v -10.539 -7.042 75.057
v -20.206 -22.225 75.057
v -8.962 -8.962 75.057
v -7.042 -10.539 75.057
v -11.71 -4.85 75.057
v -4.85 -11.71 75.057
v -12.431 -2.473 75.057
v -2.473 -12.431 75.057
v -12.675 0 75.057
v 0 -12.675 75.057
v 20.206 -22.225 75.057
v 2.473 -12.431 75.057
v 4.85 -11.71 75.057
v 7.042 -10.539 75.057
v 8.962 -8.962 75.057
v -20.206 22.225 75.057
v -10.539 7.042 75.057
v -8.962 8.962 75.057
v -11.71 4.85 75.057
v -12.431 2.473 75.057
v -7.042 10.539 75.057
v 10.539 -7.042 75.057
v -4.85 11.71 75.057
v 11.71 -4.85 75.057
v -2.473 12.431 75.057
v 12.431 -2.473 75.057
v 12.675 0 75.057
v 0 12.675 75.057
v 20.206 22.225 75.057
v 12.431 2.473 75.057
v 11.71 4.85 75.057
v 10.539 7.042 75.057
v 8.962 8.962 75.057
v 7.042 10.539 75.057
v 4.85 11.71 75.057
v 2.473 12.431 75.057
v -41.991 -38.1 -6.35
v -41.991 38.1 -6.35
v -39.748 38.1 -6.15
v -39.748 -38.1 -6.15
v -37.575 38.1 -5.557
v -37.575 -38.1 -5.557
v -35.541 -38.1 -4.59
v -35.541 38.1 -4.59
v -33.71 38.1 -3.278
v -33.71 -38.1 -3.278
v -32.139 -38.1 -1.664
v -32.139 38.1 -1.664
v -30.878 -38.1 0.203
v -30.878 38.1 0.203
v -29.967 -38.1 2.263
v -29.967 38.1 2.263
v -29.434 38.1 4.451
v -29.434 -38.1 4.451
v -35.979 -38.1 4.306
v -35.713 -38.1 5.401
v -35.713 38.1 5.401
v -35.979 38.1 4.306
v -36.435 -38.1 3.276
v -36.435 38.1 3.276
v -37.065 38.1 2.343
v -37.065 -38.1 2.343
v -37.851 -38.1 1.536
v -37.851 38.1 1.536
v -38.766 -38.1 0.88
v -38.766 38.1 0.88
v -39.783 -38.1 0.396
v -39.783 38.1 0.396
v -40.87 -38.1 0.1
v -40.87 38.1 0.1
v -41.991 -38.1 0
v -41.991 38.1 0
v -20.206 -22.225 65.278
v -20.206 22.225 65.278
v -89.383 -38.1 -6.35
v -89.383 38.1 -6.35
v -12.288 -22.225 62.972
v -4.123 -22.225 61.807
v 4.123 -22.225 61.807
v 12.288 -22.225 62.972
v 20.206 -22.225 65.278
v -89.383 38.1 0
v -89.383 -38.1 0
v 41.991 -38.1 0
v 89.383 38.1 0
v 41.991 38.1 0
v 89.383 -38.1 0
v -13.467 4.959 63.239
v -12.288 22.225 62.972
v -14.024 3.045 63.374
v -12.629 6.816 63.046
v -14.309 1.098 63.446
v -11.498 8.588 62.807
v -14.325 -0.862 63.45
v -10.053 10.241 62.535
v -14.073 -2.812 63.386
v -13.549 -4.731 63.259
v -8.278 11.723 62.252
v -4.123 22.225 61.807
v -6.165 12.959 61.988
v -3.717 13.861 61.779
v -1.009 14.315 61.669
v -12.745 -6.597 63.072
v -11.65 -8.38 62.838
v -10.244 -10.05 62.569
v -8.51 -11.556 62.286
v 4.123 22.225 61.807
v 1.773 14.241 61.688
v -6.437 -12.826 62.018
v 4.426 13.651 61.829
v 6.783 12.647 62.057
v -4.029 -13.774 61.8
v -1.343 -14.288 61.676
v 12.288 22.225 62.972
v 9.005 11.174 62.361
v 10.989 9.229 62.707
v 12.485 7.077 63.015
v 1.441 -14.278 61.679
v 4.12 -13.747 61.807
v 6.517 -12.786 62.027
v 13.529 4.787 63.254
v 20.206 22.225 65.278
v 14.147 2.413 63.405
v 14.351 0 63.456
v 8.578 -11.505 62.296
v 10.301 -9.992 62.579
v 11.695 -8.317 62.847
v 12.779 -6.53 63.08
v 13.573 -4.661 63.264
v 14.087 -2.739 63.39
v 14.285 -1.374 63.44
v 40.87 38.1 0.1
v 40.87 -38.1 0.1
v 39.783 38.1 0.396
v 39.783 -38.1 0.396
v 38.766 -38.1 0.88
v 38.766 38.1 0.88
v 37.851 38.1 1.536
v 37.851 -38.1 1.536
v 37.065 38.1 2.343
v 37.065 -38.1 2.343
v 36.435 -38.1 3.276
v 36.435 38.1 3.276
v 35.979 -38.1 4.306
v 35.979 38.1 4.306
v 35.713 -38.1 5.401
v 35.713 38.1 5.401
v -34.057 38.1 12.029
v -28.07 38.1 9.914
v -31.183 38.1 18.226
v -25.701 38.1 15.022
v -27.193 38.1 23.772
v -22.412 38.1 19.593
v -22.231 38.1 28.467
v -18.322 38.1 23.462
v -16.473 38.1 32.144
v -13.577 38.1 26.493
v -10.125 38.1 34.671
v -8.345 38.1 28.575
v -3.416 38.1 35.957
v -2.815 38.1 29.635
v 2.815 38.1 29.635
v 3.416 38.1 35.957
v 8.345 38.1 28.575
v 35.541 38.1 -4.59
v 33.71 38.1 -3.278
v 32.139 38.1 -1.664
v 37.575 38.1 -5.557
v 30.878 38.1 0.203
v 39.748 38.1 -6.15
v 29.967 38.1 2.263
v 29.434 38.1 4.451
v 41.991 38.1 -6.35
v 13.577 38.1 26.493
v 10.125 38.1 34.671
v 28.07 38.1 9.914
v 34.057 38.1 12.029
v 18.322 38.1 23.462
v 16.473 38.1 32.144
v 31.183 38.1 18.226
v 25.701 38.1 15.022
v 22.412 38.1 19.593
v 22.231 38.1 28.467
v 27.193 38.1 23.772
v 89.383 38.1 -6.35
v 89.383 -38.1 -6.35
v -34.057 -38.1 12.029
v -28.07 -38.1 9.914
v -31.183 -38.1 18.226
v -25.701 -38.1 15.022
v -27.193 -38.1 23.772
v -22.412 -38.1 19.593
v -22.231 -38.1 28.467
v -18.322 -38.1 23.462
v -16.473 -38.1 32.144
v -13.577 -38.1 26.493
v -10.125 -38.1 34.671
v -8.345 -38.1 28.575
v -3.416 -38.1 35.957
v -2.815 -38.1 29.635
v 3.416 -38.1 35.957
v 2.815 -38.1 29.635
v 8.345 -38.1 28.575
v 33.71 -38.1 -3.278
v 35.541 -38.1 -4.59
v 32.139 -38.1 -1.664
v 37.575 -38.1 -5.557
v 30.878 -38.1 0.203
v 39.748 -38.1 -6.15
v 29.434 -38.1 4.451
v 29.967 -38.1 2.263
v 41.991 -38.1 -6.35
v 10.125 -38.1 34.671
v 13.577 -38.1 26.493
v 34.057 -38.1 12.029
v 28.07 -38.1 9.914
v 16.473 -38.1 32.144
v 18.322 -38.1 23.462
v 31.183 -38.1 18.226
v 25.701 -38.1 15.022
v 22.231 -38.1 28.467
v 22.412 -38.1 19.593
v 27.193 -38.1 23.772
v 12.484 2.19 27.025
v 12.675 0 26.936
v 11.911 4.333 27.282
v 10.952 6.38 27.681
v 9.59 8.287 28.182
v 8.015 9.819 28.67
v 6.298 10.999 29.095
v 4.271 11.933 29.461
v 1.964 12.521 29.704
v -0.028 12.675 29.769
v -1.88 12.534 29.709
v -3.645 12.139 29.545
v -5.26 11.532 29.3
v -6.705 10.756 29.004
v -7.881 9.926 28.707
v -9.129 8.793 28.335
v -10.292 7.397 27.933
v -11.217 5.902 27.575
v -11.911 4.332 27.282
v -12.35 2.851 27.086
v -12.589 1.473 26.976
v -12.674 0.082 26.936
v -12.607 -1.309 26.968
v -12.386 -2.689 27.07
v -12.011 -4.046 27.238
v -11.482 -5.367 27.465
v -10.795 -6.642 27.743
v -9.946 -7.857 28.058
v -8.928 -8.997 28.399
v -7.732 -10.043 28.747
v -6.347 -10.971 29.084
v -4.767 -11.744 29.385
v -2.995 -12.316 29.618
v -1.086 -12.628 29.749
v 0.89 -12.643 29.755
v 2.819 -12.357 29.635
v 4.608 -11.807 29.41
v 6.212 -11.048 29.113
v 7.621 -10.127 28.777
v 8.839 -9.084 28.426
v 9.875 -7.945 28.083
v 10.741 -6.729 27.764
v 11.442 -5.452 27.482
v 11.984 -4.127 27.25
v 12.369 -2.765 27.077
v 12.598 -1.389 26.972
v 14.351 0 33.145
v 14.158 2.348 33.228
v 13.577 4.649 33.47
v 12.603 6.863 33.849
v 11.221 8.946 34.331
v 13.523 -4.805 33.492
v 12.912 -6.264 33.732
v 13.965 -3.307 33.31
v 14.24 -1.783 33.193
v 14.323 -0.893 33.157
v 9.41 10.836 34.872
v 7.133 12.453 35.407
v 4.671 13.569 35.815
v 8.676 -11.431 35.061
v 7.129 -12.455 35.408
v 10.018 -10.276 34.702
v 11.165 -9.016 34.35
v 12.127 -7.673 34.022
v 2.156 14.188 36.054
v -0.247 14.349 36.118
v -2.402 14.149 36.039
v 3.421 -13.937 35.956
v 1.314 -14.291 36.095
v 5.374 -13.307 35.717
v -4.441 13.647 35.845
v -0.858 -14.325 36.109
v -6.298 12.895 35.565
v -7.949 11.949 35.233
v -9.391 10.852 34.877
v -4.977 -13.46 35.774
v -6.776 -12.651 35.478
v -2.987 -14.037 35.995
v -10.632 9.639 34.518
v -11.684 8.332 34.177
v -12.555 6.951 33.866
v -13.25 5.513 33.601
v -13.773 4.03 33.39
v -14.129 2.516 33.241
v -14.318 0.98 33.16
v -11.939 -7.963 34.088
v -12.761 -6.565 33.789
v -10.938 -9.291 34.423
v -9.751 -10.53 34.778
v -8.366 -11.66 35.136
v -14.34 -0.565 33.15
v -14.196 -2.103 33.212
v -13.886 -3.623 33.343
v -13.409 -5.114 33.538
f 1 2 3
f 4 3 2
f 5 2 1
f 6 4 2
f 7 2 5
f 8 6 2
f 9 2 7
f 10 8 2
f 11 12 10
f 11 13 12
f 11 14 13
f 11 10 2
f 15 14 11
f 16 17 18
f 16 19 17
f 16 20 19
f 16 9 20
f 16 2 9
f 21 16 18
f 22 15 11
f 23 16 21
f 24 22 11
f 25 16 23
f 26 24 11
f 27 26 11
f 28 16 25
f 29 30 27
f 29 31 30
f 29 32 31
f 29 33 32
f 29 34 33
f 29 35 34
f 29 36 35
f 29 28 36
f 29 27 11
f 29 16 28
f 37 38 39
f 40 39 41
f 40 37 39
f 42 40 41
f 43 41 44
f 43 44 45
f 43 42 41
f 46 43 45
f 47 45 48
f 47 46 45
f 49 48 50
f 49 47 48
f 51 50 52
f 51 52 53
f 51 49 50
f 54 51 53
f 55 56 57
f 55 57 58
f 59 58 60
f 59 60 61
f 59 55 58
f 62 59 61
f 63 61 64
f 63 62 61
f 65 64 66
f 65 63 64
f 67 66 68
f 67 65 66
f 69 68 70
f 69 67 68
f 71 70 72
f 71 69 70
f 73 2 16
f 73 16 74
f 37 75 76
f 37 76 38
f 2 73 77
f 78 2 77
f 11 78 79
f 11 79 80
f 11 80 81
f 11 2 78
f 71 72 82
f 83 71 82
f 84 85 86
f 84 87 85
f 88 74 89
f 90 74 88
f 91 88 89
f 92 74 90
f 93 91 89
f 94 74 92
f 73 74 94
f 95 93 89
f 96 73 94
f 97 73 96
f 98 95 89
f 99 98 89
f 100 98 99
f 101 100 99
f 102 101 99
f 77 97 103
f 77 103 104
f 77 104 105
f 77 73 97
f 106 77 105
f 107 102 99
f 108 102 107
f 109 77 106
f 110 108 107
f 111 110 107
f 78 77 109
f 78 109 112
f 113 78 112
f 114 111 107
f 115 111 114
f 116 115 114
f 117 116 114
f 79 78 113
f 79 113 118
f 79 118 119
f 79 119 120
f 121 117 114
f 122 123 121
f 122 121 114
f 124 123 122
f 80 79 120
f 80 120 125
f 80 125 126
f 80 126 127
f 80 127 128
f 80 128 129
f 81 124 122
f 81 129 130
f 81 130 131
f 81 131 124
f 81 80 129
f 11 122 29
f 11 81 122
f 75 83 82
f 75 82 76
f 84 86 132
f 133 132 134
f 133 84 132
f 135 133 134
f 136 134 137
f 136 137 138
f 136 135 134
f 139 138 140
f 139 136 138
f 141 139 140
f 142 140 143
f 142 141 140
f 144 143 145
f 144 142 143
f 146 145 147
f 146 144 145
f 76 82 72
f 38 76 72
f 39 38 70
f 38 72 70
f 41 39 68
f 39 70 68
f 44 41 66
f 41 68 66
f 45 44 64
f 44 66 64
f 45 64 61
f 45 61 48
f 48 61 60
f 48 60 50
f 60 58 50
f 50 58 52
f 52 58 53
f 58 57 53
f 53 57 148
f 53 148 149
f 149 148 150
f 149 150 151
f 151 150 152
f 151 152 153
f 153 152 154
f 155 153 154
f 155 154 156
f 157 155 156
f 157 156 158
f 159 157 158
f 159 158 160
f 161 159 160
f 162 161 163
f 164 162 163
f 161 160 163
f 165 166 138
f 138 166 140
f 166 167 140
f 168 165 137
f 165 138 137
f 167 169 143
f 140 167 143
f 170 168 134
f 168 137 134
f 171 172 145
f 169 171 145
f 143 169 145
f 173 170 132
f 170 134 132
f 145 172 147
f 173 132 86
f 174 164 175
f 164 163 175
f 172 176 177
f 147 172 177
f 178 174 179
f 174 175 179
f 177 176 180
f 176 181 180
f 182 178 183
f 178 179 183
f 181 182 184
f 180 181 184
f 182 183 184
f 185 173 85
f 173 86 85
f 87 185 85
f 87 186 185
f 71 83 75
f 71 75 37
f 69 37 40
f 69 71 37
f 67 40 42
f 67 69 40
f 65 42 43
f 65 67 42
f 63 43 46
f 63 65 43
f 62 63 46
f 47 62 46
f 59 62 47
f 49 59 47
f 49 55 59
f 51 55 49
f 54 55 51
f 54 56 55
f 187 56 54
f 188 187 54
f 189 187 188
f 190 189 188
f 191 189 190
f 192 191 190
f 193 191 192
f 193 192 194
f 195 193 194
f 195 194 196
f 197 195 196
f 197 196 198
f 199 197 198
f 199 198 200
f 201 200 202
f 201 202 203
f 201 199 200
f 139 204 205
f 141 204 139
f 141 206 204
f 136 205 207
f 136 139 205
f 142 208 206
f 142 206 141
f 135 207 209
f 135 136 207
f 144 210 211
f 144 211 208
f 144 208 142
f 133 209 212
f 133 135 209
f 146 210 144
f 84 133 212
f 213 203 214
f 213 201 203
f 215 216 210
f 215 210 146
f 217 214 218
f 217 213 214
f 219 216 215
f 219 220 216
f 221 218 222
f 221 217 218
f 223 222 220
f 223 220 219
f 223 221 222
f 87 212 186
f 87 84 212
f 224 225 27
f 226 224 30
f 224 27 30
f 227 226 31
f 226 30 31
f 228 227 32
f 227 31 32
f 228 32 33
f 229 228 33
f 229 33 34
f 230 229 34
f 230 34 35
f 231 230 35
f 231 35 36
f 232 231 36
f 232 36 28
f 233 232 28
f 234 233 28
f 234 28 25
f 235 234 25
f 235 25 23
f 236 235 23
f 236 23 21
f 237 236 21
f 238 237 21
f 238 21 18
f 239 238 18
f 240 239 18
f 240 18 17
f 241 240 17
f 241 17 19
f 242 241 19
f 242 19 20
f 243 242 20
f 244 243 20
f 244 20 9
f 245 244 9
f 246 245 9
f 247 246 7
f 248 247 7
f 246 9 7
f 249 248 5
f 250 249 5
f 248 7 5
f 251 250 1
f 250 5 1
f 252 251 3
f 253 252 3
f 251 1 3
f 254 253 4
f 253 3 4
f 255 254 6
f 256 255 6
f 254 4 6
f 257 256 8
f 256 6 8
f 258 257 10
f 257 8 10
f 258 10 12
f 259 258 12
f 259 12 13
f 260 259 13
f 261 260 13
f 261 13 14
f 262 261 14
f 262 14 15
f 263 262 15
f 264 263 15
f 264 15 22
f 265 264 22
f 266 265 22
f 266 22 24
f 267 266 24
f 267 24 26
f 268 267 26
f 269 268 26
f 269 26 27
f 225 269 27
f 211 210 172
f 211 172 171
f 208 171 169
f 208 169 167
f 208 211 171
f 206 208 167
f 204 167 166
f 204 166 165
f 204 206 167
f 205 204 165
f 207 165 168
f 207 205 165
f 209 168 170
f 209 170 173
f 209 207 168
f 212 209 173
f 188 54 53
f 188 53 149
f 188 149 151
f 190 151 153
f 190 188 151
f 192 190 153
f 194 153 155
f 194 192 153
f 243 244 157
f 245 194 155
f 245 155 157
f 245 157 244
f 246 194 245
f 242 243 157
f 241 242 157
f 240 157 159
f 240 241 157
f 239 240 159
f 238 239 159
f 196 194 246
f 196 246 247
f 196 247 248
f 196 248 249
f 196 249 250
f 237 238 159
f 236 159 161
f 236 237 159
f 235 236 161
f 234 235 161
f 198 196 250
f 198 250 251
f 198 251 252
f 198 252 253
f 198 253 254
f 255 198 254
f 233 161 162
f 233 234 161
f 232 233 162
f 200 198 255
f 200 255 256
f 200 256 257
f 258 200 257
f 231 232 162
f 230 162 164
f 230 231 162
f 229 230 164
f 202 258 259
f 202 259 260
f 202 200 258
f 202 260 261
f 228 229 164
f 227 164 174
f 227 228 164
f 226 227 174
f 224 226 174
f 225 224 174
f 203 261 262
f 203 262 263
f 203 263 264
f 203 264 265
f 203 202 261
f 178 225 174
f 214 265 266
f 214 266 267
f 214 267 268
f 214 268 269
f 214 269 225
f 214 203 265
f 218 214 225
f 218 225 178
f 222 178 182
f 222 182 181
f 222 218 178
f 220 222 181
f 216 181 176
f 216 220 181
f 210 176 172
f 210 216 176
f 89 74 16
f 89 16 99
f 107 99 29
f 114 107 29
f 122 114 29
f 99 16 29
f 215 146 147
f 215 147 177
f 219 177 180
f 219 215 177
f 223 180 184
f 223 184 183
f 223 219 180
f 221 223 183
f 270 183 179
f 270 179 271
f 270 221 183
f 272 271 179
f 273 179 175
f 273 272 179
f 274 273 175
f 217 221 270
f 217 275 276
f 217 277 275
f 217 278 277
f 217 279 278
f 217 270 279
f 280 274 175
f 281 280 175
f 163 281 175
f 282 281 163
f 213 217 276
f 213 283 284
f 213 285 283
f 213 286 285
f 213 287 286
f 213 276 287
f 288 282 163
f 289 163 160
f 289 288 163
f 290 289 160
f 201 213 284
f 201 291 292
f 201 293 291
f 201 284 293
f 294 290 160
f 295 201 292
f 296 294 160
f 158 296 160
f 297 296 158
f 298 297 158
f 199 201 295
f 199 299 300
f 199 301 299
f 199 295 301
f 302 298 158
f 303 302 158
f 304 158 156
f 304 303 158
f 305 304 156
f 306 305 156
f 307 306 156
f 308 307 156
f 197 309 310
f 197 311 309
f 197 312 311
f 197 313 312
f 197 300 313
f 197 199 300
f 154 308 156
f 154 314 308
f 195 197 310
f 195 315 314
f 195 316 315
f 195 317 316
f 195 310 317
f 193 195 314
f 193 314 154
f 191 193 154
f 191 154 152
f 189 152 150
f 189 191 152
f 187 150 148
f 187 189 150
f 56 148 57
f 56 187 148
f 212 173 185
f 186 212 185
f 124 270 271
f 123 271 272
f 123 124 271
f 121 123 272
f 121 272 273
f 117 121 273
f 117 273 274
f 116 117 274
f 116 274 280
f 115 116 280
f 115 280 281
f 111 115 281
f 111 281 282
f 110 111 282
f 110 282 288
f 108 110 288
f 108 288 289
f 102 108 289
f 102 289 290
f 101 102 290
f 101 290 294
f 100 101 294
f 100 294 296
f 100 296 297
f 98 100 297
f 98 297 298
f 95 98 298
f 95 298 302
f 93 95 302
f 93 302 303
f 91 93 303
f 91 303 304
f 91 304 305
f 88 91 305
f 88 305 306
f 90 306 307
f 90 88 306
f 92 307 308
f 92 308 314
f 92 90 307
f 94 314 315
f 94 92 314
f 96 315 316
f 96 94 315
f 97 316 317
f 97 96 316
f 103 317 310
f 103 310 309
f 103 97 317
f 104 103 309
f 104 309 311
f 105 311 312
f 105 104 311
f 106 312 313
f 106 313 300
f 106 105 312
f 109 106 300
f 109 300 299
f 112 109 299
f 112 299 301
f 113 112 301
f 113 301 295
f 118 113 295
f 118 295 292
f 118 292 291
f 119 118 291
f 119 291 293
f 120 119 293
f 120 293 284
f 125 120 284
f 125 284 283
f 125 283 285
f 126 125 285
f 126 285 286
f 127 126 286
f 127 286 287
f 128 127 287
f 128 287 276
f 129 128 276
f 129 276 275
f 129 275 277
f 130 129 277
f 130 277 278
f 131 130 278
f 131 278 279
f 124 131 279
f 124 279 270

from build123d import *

# Parameters (mm, degrees)
F1_DEPTH = 38.1
F3_DEPTH = 22.225
F4_R     = 14.351
F5_REACH = 121.9987572146
F6_R     = 12.6746
F7_DEPTH = 81.4079995473


# Not quite as in the source:
# - a feature names something its author has since deleted; it is built from what else it names


with BuildPart() as f1:
    # F0 (on Front) → F1 (new body, symmetric)
    with BuildSketch(Plane.XZ):
        with BuildLine():
            ThreePointArc((41.9913857052, 0), (37.8505272155, 1.5358758877), (35.7127694215, 5.4005382775))
            ThreePointArc((35.7127694215, 5.4005382775), (0, 36.1188), (-35.7127694215, 5.4005382775))
            ThreePointArc((-35.7127694215, 5.4005382775), (-37.8505272155, 1.5358758877), (-41.9913857052, 0))
            Line((-41.9913857052, 0), (-89.3826, 0))
            Line((-89.3826, 0), (-89.3826, -6.3499995473))
            Line((-89.3826, -6.3499995473), (-41.9913857052, -6.3499995473))
            ThreePointArc((-41.9913857052, -6.3499995473), (-33.7096690211, -3.2782478815), (-29.4341535854, 4.4510766227))
            ThreePointArc((-29.4341535854, 4.4510766227), (0, 29.7688004527), (29.4341535854, 4.4510766227))
            ThreePointArc((29.4341535854, 4.4510766227), (33.7096690211, -3.2782478815), (41.9913857052, -6.3499995473))
            Line((41.9913857052, -6.3499995473), (89.3826, -6.3499995473))
            Line((89.3826, -6.3499995473), (89.3826, 0))
            Line((89.3826, 0), (41.9913857052, 0))
        make_face()
    extrude(amount=F1_DEPTH, both=True)



with BuildPart() as f3:
    # F2 (on Front) → F3 (new body, symmetric)
    with BuildSketch(Plane.XZ):
        with BuildLine():
            Line((20.2057, 75.057), (0, 75.057))
            Line((0, 75.057), (-20.2057, 75.057))
            Line((-20.2057, 75.057), (-20.2057, 65.278))
            ThreePointArc((-20.2057, 65.278), (0, 61.6607352251), (20.2057, 65.278))
            Line((20.2057, 65.278), (20.2057, 75.057))
        make_face()
    extrude(amount=F3_DEPTH, both=True)


with BuildPart() as f1_1:
    add(f1.part)

    add(f3.part)  # F5 merges F3
    f5_end = f1_1.faces().sort_by_distance((0, 0, 36.1188))[0]
    # F4 (on face) → F5 (join, up to a face of the model that its end follows)
    with BuildSketch(Plane.XY.offset(75.057)):
        Circle(F4_R)
    f5_long = extrude(amount=-F5_REACH, mode=Mode.PRIVATE)
    add(split(f5_long, bisect_by=f5_end, keep=Keep.TOP, mode=Mode.PRIVATE))

    # F6 (on face) → F7 (cut, through all)
    with BuildSketch(Plane.XY.offset(75.057)):
        Circle(F6_R)
    extrude(amount=-F7_DEPTH, mode=Mode.SUBTRACT)


solid = f1_1.part
